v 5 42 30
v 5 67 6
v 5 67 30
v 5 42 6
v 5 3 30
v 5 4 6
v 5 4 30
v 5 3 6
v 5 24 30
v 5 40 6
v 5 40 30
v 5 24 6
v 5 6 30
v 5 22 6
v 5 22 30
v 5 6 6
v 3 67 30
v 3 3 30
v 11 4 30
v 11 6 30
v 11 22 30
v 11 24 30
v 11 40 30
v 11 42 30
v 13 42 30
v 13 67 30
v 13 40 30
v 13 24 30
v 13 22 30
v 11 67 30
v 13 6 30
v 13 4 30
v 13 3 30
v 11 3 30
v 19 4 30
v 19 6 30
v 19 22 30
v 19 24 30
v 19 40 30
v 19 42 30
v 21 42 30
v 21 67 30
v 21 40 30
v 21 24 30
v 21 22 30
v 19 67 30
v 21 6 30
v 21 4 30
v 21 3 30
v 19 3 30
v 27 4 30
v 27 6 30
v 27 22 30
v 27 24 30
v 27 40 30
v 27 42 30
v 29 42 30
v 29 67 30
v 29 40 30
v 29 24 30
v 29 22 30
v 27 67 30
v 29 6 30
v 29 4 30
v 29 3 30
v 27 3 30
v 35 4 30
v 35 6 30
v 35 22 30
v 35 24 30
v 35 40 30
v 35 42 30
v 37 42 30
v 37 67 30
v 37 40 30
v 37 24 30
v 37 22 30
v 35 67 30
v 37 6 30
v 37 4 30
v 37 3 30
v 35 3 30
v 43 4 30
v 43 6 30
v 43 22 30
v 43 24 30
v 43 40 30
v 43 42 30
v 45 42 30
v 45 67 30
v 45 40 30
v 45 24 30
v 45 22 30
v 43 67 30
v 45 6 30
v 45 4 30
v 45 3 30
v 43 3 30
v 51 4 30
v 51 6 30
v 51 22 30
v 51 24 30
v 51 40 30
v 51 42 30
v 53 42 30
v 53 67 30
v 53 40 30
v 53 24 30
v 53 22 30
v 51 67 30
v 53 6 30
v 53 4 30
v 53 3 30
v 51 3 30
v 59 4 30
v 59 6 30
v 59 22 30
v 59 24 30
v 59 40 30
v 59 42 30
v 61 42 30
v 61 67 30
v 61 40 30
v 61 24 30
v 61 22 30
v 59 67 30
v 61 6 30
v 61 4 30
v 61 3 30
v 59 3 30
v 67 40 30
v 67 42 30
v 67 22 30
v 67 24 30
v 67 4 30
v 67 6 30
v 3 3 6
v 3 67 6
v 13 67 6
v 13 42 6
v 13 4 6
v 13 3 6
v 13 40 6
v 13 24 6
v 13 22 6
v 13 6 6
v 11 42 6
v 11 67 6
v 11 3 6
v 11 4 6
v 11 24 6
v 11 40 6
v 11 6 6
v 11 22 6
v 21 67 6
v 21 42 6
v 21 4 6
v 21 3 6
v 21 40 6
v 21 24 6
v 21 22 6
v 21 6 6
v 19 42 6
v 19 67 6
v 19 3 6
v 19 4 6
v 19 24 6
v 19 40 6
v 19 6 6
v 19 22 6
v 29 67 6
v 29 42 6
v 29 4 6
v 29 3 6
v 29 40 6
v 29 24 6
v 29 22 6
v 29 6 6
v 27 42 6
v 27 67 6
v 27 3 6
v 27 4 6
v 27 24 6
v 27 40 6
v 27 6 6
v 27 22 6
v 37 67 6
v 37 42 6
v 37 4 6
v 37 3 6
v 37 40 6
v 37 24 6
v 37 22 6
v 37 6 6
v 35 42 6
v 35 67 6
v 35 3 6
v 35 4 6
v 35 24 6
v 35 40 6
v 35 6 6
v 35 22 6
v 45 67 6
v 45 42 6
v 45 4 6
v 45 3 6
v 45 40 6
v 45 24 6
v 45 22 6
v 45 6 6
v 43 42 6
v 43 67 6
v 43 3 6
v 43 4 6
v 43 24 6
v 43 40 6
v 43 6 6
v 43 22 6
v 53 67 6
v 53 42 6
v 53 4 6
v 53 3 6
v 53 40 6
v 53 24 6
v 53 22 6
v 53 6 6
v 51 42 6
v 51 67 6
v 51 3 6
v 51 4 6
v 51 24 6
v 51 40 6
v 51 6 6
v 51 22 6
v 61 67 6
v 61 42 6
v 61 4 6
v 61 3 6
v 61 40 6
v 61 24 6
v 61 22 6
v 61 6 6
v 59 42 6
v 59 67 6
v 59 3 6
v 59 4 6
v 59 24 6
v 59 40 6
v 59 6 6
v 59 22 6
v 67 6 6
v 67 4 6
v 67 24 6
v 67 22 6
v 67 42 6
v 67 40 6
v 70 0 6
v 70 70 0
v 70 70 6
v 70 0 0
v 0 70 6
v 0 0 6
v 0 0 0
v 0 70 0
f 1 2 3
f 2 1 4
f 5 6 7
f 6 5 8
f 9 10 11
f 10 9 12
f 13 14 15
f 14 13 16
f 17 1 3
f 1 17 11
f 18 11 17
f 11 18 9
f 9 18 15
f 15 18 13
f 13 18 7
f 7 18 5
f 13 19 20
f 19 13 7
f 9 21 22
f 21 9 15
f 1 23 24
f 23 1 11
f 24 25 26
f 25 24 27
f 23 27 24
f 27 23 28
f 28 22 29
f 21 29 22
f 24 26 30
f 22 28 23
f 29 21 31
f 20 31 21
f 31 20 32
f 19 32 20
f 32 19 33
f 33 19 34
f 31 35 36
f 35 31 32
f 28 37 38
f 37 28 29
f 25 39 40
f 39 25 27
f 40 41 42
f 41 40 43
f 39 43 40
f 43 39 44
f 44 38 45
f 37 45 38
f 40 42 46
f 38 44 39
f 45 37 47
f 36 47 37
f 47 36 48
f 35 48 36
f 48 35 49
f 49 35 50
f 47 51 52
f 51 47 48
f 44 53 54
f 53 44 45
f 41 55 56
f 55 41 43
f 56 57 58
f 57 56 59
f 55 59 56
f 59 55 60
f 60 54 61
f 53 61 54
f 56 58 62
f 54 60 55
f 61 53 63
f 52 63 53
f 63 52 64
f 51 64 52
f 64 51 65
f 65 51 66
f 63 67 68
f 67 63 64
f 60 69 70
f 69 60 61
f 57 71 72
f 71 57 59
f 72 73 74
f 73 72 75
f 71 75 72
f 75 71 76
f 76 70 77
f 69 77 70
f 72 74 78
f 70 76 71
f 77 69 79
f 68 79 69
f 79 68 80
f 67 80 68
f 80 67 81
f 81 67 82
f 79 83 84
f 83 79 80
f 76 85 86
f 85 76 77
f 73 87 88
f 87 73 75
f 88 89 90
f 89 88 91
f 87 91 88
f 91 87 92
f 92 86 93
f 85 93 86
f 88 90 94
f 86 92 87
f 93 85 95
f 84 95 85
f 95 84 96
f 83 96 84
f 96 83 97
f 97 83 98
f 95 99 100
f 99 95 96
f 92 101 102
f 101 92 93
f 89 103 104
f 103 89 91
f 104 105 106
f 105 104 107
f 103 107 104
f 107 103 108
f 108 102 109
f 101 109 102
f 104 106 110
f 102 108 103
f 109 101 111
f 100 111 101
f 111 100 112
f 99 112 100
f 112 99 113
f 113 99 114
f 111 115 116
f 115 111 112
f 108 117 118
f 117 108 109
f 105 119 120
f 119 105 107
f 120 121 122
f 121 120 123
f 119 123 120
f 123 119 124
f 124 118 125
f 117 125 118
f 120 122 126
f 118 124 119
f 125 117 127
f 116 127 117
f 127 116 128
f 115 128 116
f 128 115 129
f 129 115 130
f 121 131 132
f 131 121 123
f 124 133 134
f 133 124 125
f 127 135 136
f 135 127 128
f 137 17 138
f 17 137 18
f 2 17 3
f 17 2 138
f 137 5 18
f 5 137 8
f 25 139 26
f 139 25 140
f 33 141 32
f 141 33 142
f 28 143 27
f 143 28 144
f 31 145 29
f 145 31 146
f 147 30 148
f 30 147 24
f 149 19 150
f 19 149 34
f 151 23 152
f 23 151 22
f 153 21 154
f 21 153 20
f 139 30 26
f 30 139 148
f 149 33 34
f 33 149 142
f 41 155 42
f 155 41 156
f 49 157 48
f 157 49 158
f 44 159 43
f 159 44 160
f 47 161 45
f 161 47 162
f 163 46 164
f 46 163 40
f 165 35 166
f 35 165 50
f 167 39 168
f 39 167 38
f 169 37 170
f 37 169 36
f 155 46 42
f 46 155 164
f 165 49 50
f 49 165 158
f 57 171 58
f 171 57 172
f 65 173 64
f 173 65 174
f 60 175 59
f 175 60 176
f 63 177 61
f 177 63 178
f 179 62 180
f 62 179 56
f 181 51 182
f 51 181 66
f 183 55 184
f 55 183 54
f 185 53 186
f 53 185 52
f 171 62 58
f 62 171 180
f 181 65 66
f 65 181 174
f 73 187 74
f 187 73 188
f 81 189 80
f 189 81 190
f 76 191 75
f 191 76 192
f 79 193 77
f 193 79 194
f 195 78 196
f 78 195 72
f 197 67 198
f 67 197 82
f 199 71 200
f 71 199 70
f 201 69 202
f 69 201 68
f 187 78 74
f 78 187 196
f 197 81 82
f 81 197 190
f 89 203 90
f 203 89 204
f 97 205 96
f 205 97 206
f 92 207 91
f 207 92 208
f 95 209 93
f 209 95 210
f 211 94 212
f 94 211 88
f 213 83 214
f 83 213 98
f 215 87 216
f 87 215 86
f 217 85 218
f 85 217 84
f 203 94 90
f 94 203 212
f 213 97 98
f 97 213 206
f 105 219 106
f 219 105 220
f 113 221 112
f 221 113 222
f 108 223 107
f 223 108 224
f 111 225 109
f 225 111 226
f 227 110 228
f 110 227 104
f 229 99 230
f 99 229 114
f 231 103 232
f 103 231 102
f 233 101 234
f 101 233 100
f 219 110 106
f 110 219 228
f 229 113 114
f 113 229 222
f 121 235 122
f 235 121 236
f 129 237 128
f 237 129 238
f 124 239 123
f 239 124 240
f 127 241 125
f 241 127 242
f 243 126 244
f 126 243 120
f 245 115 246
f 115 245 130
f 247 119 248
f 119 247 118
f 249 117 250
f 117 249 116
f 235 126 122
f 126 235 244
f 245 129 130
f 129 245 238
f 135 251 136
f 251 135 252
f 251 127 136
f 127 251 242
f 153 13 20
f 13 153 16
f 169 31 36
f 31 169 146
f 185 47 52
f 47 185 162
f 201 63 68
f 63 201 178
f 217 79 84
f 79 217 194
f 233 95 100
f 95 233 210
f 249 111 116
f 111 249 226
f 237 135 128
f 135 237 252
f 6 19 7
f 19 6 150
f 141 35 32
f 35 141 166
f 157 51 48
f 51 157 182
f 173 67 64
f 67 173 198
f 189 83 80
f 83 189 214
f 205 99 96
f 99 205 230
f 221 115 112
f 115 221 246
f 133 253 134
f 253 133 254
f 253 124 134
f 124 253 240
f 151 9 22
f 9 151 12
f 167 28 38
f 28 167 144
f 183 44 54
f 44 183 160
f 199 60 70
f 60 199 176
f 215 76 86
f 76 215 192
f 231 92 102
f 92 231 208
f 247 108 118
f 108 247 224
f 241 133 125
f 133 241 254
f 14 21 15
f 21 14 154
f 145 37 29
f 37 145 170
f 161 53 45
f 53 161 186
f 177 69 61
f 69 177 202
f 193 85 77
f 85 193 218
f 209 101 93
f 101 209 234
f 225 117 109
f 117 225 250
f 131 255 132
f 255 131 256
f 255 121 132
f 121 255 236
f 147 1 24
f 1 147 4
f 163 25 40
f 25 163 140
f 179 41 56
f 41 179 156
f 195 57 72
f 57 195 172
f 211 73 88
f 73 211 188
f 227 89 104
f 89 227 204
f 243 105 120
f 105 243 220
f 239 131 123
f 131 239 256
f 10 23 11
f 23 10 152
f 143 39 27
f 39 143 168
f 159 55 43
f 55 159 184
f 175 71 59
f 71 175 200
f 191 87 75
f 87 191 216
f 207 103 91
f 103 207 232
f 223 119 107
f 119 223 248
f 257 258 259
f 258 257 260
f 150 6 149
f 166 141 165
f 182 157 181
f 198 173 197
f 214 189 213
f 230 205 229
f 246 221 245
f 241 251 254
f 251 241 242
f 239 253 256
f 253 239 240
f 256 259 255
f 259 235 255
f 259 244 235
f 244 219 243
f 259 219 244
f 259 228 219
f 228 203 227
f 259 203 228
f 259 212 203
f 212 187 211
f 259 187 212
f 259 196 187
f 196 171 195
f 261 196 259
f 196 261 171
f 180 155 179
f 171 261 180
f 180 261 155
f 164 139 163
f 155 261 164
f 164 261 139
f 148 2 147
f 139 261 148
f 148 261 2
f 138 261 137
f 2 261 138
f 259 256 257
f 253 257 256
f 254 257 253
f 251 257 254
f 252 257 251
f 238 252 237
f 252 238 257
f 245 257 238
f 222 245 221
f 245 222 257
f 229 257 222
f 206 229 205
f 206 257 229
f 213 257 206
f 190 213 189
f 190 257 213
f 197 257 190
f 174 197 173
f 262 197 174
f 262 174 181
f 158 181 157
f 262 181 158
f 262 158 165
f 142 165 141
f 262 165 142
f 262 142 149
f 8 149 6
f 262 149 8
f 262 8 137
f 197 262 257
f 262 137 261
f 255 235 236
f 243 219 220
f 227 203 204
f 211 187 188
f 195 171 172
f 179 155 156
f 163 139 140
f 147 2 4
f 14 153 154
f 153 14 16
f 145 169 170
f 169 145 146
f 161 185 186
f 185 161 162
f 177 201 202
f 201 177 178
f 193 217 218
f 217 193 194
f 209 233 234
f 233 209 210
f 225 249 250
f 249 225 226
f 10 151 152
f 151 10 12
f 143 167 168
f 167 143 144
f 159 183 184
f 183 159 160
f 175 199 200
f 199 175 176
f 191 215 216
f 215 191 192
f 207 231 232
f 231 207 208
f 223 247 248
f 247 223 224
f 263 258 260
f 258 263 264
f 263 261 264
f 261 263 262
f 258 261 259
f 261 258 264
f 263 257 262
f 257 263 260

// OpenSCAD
$fn = 32;

// ----------------------------------------------------------------------
// Heatsink: cross fin block
// ----------------------------------------------------------------------

// --- parameters (mm) ---
base_l = 70;              // base length, X
base_w = 70;              // base width, Y
base_t = 6;               // base plate thickness
fin_h = 25;               // fin height above the base
fin_t = 2;                // fin thickness
edge = 3;                 // margin from the base ends
pitch = 8;                // fin pitch
rib_pitch = 18;           // cross rib pitch

n_fins = floor((base_l - 2 * edge - fin_t) / pitch) + 1;  // fin count
total_h = base_t + fin_h - 1;  // overall height
n_ribs = floor((base_w - 2 * edge) / rib_pitch);  // rib count

union() {
  cube([base_l, base_w, base_t]);
  for (i = [0 : n_fins - 1])
    translate([edge + i * pitch, edge, base_t - 1])
      cube([fin_t, base_w - 2 * edge, fin_h]);
  for (i = [0 : n_ribs - 1])
    translate([edge, edge + 1 + i * rib_pitch, base_t - 1])
      cube([base_l - 2 * edge, fin_t, fin_h]);
}
